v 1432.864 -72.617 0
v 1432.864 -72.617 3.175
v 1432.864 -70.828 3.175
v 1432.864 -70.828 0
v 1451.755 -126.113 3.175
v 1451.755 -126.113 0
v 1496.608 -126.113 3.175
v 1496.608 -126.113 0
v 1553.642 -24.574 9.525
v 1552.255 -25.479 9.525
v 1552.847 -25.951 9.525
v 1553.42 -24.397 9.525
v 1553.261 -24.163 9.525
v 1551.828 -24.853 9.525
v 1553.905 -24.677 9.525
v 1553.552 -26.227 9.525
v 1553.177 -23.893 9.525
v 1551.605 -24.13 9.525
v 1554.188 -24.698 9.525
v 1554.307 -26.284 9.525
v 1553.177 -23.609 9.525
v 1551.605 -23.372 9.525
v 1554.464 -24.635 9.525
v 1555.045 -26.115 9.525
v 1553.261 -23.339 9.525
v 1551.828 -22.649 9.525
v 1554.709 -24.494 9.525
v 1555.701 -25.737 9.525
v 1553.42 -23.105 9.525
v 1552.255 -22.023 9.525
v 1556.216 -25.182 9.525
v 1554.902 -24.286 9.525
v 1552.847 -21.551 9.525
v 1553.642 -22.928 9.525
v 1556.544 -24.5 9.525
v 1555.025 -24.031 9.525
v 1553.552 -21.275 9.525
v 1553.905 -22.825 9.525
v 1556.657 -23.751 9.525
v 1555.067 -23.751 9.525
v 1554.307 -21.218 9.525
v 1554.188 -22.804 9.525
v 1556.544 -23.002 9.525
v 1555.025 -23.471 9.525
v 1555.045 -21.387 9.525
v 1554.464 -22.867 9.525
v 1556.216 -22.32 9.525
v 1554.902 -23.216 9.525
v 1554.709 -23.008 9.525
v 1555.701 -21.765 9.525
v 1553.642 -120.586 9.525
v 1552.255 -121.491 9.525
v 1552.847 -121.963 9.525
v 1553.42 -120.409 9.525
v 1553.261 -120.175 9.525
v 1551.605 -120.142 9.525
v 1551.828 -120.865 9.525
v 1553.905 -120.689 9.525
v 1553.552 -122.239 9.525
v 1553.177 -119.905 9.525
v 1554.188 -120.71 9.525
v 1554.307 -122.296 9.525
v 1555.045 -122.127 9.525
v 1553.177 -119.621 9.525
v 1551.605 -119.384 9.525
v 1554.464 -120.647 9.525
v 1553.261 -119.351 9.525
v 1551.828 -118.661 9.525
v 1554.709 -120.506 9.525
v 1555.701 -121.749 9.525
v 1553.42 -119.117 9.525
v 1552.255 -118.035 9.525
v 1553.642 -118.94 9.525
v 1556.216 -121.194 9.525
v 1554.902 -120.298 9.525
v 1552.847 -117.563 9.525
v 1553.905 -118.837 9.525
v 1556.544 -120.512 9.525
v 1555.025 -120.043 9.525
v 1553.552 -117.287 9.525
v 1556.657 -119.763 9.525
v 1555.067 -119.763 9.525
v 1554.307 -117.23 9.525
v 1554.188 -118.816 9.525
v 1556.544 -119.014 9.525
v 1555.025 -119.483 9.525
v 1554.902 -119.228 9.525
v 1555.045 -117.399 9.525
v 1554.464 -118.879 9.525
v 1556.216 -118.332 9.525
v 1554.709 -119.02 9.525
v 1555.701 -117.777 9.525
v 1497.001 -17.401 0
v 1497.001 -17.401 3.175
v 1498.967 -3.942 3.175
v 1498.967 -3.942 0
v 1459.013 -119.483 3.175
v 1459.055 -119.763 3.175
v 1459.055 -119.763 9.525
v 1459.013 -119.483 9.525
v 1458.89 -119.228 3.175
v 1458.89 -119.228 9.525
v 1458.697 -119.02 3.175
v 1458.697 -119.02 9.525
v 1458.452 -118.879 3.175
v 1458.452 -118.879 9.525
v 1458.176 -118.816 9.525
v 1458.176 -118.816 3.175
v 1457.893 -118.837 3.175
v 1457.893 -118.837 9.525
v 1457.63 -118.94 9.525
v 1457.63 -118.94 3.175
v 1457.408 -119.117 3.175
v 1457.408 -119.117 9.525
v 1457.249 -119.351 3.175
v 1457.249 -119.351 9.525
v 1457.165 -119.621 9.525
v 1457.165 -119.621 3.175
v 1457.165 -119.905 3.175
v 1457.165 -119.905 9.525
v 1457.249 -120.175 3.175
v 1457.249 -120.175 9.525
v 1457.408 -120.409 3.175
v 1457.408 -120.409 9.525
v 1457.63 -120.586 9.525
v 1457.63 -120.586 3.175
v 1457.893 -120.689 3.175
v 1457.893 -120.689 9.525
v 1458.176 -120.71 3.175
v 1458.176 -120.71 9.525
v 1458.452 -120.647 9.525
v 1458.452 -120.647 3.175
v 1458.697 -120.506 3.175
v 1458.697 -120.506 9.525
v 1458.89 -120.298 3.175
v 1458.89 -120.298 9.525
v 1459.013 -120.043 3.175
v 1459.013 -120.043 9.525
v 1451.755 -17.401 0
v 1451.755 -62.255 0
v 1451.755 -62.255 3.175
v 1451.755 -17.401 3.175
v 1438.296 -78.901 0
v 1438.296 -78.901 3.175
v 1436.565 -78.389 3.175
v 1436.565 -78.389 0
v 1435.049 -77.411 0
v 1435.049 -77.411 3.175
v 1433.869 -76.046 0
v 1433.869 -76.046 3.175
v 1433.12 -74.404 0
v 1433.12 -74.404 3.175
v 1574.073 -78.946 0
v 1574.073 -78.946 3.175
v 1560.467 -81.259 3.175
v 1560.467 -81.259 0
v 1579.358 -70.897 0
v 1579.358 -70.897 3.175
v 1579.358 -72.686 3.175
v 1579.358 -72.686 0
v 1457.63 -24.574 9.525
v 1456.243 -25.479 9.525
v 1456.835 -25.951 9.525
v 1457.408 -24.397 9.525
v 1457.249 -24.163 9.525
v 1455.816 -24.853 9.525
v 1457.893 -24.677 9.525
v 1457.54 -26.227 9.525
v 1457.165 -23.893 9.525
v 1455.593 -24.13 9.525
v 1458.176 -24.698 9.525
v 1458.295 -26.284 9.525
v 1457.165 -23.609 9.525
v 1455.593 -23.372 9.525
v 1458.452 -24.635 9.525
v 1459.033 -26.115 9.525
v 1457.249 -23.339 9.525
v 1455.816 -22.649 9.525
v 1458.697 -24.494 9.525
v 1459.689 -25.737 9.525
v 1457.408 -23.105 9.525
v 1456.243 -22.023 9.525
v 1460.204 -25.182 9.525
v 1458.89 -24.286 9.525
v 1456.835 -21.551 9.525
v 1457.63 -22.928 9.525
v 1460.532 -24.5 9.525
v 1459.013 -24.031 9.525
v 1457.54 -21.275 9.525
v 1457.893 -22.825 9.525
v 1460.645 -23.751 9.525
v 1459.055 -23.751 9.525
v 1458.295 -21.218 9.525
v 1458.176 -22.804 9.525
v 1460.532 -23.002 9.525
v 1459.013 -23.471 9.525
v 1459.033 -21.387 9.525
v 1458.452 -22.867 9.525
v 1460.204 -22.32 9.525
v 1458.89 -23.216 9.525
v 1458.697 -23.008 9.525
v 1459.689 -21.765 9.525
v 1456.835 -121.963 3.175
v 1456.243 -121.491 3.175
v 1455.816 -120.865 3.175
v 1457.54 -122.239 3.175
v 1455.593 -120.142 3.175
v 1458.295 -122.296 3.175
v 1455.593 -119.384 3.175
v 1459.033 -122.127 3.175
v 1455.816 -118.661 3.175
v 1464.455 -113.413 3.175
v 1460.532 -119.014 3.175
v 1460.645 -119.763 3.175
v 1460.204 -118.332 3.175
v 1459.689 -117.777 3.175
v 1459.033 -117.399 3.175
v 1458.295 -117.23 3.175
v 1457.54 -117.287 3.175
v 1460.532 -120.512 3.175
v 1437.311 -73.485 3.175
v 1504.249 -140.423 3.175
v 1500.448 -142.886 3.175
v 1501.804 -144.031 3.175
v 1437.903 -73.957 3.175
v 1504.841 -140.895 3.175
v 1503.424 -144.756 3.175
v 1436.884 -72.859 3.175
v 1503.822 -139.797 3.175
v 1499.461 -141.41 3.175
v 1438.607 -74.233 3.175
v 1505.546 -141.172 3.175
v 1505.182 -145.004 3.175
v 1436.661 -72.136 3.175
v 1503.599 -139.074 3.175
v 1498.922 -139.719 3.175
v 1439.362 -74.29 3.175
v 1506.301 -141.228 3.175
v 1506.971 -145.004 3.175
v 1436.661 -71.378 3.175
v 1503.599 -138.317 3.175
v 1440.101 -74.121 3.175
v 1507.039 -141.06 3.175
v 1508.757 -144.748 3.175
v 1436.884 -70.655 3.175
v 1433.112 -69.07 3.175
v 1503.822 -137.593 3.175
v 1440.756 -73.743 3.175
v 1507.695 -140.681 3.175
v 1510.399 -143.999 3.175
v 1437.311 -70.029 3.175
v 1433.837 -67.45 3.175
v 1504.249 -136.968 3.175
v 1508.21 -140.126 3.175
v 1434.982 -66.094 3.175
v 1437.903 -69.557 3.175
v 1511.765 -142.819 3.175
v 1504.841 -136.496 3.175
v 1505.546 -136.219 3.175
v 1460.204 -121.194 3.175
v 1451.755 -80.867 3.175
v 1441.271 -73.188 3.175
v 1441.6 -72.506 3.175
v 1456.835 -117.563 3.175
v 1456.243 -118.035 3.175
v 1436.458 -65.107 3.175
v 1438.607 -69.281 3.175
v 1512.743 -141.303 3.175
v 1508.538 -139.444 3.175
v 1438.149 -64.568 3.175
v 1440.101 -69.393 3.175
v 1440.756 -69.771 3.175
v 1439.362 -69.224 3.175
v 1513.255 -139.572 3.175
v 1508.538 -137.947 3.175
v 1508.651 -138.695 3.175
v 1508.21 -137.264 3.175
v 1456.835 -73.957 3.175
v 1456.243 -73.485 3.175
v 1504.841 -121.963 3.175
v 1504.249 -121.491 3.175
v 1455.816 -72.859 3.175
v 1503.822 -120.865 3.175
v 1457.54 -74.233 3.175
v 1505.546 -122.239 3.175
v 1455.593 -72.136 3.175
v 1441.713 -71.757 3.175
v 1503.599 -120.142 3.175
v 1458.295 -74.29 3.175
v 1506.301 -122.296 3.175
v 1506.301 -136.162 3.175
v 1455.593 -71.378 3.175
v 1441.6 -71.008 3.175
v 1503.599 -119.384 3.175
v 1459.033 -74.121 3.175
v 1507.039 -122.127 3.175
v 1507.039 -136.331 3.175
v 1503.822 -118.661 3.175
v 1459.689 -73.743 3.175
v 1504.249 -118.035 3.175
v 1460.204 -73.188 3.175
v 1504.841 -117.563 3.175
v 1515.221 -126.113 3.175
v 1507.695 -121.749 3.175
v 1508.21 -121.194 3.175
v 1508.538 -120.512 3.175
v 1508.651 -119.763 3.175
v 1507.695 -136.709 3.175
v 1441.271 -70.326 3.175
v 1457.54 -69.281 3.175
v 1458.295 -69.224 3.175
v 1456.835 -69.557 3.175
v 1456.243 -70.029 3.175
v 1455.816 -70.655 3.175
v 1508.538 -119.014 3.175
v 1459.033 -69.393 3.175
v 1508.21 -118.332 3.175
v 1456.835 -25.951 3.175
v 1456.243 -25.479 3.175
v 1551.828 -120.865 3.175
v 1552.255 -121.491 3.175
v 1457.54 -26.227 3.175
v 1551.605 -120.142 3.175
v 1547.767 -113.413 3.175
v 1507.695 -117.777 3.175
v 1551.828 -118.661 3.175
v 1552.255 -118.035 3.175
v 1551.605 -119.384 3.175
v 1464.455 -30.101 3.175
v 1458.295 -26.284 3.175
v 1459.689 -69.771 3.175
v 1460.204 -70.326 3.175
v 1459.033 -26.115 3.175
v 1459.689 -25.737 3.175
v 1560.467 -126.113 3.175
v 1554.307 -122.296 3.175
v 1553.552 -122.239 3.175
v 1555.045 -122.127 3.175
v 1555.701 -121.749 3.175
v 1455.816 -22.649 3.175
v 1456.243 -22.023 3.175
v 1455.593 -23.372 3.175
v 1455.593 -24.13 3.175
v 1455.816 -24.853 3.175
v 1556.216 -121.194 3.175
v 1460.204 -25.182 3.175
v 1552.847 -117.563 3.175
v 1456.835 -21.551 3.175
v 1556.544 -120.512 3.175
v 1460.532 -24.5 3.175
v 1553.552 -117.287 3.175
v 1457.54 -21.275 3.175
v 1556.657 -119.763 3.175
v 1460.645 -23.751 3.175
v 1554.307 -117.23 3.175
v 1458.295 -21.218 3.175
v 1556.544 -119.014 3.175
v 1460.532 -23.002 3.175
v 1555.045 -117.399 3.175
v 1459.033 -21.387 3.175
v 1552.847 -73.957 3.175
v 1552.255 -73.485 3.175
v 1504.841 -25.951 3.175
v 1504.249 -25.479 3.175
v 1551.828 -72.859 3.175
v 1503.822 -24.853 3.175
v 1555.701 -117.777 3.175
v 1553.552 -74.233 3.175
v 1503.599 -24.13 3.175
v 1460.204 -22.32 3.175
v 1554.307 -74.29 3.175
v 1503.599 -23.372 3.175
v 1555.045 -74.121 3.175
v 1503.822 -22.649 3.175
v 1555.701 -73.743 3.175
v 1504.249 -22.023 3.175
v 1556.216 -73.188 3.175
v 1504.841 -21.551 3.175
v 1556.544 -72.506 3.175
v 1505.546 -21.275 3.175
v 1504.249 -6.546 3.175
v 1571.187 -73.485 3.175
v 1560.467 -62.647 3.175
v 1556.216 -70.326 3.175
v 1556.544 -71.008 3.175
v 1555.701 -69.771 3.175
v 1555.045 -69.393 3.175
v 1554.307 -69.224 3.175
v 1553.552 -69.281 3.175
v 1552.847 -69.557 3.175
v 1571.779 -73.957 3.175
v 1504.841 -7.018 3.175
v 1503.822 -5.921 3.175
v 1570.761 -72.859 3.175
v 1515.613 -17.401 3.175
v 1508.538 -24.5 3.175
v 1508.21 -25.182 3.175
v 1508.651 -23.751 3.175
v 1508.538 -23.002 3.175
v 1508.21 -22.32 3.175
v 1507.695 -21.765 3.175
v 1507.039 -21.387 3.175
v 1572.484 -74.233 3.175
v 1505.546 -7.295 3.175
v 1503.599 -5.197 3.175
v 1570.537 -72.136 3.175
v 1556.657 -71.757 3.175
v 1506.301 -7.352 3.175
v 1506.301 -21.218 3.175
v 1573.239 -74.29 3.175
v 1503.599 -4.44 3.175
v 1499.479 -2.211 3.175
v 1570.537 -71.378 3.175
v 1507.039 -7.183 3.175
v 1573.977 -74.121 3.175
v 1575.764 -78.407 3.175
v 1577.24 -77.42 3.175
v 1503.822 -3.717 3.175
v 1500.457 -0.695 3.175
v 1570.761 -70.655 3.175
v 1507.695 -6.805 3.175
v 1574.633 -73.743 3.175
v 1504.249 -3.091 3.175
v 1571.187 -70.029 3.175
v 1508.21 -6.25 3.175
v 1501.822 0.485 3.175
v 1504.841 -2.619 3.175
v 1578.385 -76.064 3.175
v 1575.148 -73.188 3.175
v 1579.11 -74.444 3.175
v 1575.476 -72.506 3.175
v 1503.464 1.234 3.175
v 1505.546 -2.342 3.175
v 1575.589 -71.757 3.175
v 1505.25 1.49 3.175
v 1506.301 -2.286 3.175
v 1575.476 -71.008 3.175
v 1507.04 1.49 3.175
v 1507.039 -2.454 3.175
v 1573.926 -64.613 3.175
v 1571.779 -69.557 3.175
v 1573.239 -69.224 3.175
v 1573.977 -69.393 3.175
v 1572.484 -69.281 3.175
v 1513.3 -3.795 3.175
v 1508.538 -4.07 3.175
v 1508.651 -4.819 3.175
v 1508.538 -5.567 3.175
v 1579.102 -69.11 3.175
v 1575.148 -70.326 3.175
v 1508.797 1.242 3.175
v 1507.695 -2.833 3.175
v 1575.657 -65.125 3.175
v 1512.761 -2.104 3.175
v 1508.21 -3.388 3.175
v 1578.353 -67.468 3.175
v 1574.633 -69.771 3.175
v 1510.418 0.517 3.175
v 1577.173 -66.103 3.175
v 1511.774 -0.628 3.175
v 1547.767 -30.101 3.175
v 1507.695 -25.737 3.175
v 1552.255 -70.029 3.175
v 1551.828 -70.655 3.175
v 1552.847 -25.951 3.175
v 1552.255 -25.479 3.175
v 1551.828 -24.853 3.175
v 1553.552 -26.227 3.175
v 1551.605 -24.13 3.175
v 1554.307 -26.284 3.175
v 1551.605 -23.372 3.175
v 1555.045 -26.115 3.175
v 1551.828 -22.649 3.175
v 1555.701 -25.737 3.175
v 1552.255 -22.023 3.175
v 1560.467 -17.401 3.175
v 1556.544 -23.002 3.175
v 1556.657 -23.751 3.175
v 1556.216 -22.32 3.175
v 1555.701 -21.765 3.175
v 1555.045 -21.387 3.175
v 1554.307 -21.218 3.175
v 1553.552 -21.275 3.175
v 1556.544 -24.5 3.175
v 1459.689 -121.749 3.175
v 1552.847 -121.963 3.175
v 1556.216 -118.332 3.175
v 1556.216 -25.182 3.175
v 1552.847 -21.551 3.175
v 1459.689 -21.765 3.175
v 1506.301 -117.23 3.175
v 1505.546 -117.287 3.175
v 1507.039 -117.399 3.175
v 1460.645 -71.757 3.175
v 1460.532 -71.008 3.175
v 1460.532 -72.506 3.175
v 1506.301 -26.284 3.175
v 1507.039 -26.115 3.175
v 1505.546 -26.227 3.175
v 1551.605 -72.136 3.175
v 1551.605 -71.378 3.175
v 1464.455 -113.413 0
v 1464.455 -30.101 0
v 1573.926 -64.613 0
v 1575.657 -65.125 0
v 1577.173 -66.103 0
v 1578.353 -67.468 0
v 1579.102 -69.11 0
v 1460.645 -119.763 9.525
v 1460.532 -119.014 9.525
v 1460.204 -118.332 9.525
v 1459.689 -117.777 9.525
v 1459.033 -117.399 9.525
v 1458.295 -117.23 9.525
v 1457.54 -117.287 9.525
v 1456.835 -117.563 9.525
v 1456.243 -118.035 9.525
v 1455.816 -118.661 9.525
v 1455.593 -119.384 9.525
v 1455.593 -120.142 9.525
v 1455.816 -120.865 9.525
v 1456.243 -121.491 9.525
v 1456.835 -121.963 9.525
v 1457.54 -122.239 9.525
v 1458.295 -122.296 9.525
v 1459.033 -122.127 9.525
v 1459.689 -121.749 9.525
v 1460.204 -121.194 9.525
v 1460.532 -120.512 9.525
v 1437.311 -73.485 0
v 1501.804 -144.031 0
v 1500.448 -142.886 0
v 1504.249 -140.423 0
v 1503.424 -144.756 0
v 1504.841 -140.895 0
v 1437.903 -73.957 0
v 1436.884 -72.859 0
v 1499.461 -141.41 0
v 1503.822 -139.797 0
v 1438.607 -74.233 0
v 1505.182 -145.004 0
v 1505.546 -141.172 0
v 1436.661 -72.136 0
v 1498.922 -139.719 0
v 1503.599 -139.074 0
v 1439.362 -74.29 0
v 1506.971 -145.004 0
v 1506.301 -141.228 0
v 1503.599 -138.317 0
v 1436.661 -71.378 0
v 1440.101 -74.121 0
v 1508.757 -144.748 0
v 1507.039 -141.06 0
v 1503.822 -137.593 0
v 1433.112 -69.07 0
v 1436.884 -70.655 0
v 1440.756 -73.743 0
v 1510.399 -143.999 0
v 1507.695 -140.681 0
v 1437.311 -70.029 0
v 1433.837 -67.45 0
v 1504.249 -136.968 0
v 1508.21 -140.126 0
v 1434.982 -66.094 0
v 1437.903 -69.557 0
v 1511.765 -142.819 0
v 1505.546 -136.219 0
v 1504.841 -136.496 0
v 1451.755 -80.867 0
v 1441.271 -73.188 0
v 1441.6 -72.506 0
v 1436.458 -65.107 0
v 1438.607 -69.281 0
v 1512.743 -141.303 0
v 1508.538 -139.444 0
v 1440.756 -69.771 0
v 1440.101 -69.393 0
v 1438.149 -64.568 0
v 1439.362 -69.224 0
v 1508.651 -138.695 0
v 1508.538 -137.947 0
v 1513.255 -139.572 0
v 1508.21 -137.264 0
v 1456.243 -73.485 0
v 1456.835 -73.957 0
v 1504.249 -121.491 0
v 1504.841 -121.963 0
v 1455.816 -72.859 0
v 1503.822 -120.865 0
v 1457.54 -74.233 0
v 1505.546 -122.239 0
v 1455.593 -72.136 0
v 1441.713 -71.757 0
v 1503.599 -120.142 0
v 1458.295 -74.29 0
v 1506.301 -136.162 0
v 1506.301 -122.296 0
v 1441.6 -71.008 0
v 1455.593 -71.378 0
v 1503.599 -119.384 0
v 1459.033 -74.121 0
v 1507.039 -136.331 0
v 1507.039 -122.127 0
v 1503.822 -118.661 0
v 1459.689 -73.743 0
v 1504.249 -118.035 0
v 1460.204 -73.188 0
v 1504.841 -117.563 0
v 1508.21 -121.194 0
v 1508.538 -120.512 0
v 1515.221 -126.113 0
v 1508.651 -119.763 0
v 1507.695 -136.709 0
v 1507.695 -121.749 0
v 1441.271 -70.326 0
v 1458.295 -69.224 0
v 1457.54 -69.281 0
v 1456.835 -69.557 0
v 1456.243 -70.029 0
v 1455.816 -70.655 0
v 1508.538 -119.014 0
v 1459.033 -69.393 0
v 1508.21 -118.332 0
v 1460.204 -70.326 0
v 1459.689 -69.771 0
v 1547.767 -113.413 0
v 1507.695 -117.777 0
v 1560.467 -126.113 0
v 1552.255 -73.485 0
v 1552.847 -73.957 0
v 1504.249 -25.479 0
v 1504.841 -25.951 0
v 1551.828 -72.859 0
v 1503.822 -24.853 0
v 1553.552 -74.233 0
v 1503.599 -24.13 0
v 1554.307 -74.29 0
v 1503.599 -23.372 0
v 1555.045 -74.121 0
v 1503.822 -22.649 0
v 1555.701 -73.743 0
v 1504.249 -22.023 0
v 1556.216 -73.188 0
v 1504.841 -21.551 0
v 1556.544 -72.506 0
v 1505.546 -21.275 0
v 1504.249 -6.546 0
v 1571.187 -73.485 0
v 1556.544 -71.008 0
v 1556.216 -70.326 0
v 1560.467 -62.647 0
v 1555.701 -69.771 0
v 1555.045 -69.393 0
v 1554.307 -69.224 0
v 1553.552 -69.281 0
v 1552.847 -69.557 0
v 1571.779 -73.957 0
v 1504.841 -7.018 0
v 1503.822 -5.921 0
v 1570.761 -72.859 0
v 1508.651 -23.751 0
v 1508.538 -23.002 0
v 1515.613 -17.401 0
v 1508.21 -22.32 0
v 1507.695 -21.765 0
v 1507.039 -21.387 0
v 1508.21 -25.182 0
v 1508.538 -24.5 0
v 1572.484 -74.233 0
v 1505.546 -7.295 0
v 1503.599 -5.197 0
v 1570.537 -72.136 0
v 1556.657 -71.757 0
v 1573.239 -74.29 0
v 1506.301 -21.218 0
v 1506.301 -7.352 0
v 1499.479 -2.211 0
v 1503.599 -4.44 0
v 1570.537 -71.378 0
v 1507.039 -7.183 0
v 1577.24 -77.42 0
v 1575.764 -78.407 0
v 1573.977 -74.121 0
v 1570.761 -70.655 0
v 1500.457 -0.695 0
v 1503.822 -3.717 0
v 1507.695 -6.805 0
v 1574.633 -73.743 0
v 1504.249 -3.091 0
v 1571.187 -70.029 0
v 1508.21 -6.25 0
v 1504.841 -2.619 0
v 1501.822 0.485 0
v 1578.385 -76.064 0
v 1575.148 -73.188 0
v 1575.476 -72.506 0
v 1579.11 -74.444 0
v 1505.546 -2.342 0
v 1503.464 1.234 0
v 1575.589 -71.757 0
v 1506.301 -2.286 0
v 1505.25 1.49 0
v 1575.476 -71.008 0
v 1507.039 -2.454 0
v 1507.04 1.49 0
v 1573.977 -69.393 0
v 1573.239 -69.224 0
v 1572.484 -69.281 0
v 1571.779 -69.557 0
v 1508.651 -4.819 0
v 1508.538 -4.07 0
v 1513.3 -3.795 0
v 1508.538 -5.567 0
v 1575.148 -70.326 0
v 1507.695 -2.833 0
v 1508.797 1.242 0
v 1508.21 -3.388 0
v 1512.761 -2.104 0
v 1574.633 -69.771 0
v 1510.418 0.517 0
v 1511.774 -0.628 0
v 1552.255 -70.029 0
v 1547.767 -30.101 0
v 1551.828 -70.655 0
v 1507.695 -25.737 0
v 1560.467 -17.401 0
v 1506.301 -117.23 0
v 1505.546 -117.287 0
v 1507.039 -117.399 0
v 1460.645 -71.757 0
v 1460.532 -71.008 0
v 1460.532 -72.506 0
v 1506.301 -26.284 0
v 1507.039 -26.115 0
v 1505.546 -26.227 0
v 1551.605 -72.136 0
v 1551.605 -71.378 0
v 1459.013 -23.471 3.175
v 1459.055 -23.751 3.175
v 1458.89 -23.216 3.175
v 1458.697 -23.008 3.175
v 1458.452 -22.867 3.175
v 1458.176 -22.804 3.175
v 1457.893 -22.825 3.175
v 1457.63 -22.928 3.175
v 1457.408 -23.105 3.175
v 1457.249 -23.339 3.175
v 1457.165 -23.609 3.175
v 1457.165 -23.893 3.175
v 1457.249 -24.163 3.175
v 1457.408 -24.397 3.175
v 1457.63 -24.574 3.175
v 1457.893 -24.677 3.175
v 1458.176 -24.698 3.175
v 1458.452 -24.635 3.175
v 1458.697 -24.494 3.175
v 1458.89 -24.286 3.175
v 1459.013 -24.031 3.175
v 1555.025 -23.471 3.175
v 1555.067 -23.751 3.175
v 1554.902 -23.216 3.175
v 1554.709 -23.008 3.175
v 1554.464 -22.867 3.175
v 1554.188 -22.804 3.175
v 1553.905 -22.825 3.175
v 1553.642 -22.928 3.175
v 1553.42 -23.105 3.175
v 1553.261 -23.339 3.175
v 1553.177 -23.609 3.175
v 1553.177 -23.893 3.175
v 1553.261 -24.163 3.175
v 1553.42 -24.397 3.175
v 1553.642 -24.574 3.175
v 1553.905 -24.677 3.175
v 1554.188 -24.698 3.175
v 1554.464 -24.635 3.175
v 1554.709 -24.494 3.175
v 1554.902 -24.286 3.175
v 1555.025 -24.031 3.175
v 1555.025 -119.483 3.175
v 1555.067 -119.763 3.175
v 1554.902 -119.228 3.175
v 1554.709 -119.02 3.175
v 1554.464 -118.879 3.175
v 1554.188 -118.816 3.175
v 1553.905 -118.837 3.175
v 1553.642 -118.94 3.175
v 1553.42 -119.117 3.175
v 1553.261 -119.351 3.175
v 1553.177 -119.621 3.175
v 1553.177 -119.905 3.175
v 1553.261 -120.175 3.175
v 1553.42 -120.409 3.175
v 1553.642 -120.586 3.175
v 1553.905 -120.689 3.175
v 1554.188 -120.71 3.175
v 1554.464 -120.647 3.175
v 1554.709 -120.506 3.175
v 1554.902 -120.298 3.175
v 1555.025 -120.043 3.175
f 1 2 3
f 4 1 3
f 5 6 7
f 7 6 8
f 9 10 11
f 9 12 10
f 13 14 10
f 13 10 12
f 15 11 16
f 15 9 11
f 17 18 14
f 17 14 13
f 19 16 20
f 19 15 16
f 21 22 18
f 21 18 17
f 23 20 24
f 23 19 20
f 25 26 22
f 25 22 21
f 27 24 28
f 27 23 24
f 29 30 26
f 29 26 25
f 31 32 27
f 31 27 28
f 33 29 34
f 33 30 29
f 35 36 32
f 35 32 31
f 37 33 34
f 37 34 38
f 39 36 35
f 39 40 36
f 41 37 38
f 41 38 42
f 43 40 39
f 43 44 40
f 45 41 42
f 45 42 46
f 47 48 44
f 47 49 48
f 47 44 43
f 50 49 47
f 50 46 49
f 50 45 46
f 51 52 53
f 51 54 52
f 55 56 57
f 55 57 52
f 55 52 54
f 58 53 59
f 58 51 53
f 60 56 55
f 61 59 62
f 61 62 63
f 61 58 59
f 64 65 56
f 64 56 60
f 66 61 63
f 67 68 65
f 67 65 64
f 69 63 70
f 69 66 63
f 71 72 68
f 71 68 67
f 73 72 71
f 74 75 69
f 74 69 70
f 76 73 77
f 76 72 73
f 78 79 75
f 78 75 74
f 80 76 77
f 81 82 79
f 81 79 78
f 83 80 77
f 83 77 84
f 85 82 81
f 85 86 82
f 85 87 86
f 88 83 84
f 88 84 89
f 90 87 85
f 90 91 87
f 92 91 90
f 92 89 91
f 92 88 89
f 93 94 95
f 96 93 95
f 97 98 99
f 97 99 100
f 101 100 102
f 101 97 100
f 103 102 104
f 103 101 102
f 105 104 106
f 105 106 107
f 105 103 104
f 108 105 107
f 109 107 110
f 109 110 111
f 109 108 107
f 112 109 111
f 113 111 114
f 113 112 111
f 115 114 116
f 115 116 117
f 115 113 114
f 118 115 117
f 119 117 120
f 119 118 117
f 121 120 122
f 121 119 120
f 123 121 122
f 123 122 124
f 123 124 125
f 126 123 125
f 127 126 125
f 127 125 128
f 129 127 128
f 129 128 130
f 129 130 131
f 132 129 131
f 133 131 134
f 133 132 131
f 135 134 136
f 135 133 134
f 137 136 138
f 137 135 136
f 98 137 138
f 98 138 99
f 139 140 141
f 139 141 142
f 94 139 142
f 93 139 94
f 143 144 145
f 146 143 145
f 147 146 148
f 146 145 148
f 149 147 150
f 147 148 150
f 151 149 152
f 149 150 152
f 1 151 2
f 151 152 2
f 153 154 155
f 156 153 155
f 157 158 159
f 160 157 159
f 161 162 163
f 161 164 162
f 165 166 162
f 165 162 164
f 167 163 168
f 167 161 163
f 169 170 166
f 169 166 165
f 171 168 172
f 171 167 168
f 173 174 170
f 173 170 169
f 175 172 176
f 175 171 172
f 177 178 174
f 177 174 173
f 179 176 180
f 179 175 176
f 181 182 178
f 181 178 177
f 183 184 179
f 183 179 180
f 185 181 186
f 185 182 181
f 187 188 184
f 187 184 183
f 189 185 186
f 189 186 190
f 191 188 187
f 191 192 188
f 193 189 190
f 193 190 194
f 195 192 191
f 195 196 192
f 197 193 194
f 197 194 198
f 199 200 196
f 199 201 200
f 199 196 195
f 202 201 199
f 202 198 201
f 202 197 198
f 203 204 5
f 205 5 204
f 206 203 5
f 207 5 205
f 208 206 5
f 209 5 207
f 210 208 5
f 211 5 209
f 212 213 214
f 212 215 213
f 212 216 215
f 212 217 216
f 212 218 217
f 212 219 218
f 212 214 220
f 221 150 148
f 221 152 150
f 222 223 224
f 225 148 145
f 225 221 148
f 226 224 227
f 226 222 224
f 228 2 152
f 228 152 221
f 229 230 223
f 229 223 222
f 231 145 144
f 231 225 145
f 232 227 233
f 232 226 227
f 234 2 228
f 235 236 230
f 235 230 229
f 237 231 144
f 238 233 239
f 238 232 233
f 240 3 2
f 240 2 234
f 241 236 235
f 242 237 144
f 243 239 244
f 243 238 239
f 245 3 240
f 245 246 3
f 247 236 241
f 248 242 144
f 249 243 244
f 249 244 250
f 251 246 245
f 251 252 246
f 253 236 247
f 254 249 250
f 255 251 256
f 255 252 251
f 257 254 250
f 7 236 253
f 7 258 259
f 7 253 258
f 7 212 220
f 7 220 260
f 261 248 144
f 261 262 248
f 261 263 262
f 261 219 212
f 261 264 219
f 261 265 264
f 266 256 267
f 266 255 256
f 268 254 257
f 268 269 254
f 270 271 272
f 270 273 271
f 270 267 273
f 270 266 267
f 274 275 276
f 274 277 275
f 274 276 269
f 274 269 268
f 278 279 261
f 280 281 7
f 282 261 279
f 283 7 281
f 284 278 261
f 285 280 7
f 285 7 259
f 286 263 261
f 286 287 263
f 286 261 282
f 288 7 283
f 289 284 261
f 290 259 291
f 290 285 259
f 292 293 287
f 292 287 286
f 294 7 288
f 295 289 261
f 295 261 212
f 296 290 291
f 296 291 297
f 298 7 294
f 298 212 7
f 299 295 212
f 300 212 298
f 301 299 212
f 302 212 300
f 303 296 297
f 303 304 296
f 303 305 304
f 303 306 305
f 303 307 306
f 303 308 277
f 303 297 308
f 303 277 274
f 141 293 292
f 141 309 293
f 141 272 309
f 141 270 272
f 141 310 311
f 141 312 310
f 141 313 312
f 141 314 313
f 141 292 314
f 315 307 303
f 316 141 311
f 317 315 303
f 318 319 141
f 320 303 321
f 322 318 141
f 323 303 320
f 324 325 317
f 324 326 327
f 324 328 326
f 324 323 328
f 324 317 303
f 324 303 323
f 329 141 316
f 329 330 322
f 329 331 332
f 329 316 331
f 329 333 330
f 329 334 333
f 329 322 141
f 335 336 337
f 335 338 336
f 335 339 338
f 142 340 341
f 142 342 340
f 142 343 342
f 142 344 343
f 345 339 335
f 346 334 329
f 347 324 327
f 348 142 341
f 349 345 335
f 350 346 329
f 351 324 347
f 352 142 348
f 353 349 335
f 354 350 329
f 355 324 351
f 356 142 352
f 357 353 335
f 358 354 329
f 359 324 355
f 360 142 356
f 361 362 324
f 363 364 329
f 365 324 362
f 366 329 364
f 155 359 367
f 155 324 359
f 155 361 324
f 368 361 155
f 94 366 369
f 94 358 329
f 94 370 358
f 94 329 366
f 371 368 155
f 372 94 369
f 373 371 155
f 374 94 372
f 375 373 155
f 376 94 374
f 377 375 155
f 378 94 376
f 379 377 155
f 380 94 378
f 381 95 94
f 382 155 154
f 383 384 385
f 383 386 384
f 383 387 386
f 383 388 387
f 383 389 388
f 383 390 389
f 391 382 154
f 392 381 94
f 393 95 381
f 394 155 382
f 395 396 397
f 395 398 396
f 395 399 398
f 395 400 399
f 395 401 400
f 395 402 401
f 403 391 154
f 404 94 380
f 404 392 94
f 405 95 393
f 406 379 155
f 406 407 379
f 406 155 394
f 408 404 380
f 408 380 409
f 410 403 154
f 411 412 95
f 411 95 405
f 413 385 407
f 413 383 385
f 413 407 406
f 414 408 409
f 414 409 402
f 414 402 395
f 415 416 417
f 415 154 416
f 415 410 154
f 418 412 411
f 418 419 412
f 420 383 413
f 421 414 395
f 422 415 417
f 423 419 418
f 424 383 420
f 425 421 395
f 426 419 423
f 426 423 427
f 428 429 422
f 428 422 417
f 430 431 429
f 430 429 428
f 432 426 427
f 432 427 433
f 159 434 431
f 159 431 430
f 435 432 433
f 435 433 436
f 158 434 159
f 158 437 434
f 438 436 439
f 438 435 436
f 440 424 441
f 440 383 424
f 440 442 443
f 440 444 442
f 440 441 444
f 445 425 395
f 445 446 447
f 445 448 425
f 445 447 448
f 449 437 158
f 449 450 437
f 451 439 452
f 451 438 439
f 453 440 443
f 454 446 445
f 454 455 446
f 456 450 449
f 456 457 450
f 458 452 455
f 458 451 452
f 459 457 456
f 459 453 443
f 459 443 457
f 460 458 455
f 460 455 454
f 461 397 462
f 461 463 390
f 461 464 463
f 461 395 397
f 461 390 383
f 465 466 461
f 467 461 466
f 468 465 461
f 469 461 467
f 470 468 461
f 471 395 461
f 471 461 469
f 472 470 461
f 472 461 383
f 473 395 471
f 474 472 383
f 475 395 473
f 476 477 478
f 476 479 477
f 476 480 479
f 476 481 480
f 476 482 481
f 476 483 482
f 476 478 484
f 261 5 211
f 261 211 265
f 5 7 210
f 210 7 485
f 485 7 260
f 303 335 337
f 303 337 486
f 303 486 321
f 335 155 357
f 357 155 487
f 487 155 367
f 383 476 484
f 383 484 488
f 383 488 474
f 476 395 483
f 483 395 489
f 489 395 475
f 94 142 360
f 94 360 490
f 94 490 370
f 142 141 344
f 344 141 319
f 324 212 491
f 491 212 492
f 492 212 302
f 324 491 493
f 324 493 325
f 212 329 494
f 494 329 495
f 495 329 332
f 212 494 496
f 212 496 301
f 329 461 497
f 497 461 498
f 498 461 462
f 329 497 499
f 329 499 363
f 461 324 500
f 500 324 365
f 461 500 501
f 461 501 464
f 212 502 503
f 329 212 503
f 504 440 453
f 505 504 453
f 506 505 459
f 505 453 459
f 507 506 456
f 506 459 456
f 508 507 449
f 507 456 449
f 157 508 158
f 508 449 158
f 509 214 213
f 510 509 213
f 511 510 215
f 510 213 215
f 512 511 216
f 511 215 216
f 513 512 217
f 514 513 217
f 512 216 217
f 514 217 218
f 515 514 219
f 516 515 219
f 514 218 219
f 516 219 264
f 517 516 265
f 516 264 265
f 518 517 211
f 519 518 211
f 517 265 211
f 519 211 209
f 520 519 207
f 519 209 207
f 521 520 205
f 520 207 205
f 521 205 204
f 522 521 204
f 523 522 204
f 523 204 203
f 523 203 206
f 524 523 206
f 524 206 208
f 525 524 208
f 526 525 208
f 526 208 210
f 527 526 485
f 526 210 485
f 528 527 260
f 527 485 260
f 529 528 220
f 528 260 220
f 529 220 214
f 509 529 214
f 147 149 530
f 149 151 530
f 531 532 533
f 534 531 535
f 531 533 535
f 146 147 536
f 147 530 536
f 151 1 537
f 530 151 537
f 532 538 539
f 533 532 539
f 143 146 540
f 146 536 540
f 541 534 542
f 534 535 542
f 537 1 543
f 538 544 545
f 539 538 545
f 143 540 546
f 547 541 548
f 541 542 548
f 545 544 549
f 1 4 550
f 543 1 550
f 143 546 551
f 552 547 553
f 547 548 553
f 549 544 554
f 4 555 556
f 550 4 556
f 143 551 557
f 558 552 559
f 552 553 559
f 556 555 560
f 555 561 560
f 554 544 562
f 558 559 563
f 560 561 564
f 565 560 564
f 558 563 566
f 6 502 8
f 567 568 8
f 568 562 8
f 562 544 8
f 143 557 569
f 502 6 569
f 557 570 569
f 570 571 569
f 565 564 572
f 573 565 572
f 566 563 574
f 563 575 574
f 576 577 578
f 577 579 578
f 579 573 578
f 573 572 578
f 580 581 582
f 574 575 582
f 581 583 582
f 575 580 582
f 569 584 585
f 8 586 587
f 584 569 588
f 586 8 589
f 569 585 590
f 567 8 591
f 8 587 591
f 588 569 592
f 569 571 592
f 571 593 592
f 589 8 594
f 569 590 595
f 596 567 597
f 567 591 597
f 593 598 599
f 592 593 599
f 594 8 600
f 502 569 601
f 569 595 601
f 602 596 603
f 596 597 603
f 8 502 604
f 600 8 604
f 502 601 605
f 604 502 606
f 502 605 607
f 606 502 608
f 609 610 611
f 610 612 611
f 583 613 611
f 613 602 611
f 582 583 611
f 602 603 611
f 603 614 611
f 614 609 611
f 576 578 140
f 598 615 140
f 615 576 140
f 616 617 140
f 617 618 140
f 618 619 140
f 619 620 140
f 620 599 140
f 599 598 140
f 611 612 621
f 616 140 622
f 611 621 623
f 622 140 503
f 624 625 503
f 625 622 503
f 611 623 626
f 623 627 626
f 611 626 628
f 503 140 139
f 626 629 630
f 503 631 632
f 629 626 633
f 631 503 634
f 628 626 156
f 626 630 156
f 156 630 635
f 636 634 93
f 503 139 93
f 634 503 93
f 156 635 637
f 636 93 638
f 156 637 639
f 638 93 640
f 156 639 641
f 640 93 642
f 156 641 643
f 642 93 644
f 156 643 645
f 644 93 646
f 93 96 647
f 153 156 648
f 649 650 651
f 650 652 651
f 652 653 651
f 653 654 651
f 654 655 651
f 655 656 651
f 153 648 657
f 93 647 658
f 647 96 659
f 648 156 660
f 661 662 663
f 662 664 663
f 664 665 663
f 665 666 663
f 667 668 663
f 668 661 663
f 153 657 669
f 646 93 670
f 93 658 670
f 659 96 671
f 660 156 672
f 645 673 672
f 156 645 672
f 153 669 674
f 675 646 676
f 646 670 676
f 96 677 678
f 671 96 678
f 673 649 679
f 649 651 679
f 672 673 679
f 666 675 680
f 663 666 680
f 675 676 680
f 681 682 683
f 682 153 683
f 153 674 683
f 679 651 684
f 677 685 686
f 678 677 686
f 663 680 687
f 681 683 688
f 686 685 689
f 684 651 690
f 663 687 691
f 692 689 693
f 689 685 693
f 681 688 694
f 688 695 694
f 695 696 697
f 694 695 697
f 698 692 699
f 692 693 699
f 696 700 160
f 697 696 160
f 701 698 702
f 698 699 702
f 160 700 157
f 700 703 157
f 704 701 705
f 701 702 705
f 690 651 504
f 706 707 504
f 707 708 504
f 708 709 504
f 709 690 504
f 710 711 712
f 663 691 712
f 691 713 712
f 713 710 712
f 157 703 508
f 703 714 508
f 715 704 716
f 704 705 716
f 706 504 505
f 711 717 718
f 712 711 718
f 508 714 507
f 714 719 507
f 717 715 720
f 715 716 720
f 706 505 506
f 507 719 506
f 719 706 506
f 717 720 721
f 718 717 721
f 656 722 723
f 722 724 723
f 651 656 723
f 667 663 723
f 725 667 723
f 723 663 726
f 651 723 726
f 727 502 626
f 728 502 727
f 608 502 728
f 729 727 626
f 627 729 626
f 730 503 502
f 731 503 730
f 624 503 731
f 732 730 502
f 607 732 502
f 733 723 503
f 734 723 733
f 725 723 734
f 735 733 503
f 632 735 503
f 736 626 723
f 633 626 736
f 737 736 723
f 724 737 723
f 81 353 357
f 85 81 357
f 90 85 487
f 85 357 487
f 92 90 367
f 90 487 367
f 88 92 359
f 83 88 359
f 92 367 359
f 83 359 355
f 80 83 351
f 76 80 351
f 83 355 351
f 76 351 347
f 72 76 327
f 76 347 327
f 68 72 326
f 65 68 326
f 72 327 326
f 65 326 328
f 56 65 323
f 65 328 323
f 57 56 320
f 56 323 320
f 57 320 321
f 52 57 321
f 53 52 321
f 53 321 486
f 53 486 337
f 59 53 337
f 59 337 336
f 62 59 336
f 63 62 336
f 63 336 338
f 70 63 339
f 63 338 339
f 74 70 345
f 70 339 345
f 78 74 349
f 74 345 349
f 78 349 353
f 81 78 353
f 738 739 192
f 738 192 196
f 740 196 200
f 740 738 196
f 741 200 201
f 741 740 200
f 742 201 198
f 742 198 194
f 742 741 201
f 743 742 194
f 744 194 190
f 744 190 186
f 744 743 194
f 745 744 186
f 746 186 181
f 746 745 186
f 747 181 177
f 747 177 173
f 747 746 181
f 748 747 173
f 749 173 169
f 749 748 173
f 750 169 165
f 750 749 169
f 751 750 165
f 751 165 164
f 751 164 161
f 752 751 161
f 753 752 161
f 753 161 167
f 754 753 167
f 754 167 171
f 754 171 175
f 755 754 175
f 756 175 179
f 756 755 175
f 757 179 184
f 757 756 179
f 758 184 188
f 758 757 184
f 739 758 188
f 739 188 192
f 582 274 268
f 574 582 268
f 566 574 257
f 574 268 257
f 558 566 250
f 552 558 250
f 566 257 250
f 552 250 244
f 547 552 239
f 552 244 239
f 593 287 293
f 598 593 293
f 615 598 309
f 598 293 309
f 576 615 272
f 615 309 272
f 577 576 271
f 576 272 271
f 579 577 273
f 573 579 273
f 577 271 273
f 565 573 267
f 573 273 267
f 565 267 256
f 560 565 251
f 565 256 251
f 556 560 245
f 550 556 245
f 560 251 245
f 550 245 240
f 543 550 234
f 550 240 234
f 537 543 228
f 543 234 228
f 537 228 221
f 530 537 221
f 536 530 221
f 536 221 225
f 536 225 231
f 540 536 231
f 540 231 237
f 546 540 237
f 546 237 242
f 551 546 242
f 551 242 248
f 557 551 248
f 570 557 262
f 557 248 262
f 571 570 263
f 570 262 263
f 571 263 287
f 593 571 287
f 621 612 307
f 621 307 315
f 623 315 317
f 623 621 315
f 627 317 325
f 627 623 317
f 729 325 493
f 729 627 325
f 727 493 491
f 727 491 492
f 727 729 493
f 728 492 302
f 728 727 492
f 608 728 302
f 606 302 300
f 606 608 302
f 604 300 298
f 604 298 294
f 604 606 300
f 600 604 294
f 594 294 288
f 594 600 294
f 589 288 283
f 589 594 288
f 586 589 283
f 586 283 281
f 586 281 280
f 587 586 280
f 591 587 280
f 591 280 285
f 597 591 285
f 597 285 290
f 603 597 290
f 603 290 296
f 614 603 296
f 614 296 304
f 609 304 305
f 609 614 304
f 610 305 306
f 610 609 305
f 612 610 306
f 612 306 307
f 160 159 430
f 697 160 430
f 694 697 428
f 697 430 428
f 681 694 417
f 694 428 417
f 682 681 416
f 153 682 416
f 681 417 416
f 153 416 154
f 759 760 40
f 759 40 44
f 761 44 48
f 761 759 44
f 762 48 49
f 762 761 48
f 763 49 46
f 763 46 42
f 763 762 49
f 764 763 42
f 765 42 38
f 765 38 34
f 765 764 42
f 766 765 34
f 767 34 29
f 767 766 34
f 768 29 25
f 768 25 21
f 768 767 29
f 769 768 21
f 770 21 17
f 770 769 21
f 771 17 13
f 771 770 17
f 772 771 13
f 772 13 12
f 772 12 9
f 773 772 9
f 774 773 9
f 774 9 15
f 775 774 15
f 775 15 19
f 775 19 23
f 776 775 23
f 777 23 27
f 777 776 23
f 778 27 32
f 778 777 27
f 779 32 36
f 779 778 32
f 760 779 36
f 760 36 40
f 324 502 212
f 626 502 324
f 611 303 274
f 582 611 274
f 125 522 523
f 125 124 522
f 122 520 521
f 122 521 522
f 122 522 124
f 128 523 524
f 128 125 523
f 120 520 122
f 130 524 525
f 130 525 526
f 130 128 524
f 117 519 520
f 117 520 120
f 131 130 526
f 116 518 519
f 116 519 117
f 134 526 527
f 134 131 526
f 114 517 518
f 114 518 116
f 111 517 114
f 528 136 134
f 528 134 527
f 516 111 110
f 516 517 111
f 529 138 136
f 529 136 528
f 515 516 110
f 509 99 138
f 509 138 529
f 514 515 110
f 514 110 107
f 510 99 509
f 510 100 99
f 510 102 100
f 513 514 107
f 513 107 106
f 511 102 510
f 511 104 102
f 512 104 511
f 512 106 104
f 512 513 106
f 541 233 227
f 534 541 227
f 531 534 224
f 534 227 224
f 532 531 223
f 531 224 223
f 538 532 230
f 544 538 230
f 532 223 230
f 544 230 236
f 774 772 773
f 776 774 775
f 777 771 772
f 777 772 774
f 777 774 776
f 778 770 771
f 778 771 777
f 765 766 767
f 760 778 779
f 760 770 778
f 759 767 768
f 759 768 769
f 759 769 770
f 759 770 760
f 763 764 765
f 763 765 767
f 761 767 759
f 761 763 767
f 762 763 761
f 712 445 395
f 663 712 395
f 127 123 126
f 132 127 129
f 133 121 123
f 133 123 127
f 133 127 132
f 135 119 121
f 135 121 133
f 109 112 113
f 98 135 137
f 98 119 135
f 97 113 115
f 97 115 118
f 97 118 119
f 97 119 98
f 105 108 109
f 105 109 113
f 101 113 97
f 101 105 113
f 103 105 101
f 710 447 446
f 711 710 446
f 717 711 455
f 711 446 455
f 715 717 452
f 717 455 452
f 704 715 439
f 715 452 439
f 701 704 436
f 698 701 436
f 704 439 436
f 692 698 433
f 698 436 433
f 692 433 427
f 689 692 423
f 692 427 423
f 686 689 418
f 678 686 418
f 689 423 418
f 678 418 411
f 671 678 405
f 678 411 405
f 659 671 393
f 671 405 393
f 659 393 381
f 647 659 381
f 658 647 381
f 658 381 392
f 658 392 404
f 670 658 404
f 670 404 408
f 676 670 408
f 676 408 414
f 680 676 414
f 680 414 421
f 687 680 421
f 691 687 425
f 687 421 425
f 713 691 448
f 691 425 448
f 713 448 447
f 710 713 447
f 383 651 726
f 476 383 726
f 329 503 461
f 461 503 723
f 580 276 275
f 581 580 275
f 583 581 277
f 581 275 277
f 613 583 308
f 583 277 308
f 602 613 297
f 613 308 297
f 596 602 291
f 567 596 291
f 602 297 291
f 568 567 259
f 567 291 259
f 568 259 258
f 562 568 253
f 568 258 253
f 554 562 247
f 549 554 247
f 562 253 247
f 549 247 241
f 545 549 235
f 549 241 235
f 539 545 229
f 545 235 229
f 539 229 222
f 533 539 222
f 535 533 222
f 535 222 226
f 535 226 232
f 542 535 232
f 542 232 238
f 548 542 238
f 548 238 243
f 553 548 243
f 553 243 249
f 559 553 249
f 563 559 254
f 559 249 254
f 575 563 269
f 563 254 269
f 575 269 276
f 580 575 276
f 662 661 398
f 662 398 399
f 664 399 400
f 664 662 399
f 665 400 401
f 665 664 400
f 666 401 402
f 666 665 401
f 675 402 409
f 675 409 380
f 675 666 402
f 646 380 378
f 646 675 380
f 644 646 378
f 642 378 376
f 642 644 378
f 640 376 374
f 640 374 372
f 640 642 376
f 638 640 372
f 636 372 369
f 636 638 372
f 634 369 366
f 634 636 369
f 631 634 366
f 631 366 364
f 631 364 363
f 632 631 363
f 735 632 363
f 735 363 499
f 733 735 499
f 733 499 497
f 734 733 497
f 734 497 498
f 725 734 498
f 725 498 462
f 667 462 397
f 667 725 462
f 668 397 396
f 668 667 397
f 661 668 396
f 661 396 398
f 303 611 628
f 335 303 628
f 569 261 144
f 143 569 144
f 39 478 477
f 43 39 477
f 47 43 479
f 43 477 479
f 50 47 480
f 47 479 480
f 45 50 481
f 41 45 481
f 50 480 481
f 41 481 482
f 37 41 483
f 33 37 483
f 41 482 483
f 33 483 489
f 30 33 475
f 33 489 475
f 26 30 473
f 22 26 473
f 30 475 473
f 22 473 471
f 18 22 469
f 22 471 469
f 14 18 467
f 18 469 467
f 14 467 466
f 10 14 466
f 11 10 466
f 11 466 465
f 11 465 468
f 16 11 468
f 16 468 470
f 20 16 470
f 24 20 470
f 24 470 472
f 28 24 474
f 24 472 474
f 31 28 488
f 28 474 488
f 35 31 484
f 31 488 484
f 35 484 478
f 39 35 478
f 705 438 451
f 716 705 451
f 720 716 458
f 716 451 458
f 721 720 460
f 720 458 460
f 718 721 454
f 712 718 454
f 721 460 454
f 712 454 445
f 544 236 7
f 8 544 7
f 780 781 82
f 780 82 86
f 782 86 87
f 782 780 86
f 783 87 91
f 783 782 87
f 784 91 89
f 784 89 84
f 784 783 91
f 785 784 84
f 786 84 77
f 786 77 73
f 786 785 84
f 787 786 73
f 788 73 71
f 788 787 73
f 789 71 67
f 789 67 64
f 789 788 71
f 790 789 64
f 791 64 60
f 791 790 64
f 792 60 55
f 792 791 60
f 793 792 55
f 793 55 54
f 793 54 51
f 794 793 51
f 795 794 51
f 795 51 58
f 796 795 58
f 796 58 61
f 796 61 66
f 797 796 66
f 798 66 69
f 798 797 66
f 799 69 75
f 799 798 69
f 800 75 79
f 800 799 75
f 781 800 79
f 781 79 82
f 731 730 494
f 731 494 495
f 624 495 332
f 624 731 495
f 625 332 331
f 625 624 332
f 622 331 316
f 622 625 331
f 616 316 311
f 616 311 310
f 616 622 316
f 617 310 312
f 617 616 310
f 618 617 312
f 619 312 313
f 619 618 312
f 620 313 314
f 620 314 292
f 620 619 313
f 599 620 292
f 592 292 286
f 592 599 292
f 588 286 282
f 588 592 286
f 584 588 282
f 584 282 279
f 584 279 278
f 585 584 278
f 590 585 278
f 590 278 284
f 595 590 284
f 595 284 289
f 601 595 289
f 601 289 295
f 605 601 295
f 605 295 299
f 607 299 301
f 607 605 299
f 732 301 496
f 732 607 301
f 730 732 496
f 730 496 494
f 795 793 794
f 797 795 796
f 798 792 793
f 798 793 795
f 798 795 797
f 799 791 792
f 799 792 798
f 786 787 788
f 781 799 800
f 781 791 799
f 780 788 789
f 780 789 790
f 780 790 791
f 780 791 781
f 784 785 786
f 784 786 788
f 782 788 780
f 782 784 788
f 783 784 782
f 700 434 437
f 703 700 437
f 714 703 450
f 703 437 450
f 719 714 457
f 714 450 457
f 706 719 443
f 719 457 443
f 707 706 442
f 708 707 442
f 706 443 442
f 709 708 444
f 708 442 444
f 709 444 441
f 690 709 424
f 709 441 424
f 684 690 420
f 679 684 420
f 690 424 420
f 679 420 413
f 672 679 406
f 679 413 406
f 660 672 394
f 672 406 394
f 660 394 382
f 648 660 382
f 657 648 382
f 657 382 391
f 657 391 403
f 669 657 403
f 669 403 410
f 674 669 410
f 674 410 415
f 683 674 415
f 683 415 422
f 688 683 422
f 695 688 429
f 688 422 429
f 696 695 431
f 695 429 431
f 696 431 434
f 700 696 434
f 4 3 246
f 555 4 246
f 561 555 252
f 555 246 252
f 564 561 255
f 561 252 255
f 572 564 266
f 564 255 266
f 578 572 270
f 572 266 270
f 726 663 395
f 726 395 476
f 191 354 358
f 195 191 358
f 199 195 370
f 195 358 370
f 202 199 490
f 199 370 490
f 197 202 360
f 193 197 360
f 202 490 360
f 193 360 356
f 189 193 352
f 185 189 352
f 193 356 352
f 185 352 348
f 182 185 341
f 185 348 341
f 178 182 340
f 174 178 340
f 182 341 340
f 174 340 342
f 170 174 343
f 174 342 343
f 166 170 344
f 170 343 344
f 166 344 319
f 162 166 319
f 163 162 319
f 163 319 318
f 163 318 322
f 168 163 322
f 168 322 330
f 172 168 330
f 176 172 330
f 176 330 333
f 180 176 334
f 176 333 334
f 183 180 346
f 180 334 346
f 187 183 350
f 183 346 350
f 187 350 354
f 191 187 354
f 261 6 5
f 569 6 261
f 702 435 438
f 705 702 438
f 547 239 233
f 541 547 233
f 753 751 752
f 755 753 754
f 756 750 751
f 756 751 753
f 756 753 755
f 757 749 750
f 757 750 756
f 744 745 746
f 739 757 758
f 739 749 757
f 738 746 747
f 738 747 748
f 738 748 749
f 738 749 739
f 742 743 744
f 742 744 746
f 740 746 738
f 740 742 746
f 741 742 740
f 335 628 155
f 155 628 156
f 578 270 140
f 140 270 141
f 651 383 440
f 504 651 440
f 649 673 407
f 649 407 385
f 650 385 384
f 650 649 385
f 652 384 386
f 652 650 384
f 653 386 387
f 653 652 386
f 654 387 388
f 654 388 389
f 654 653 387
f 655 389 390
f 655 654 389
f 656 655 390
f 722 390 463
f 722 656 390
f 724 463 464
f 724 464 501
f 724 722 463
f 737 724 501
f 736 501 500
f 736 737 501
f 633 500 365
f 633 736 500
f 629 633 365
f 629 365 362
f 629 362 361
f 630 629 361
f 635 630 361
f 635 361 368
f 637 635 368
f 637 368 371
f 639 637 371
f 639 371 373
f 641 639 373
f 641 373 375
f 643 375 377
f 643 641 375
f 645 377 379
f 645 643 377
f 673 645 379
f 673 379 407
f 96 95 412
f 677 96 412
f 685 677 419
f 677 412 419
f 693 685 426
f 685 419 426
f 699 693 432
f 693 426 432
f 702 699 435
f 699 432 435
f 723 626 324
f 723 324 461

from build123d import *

# Parameters (mm, degrees)
SKETCH1_W           = 108.712
SKETCH1_H           = 108.712
SKETCH1_R           = 2.54
SKETCH1_R_2         = 3.175
SKETCH1_W_2         = 83.312
SKETCH1_H_2         = 83.312
SKETCH1_R_3         = 0.94996
SKETCH1_R_4         = 0.95
BOSS_EXTRUDE1_DEPTH = 3.175
SKETCH2_R           = 2.54
SKETCH2_R_2         = 0.95
BOSS_EXTRUDE2_DEPTH = 6.35
SKETCH3_R           = 2.54
BOSS_EXTRUDE3_DEPTH = 3.175


with BuildPart() as part:
    # Sketch1 → Boss-Extrude1 (new body)
    # profile 1 of 9: a face of its own
    with BuildSketch(Plane.XY):
        with Locations((1506.110862596, -71.75697427)):
            Rectangle(SKETCH1_W, SKETCH1_H)
        with Locations((1506.110862596, -23.75097427)):
            Circle(SKETCH1_R, mode=Mode.SUBTRACT)
        with Locations((1458.104862596, -23.75097427)):
            Circle(SKETCH1_R_2, mode=Mode.SUBTRACT)
        with Locations((1506.110862596, -119.76297427)):
            Circle(SKETCH1_R, mode=Mode.SUBTRACT)
        with Locations((1554.116862596, -71.75697427)):
            Circle(SKETCH1_R, mode=Mode.SUBTRACT)
        with Locations((1458.104862596, -71.75697427)):
            Circle(SKETCH1_R, mode=Mode.SUBTRACT)
        with Locations((1458.104862596, -119.76297427)):
            Circle(SKETCH1_R, mode=Mode.SUBTRACT)
        with Locations((1554.116862596, -119.76297427)):
            Circle(SKETCH1_R, mode=Mode.SUBTRACT)
        with Locations((1554.116862596, -23.75097427)):
            Circle(SKETCH1_R, mode=Mode.SUBTRACT)
        with Locations((1506.110862596, -71.75697427)):
            Rectangle(SKETCH1_W_2, SKETCH1_H_2, mode=Mode.SUBTRACT)
    # profile 2 of 9: a face of its own
    with BuildSketch(Plane.XY):
        with Locations((1554.116862596, -119.76297427)):
            Circle(SKETCH1_R)
        with Locations((1554.116862596, -119.76297427)):
            Circle(SKETCH1_R_3, mode=Mode.SUBTRACT)
    # profile 3 of 9: a face of its own
    with BuildSketch(Plane.XY):
        with Locations((1554.116862596, -119.76297427)):
            Circle(SKETCH1_R_3)
    # profile 4 of 9: a face of its own
    with BuildSketch(Plane.XY):
        with Locations((1458.104862596, -119.76297427)):
            Circle(SKETCH1_R)
        with Locations((1458.104862596, -119.76297427)):
            Circle(SKETCH1_R_3, mode=Mode.SUBTRACT)
    # profile 5 of 9: a face of its own
    with BuildSketch(Plane.XY):
        with Locations((1458.104862596, -119.76297427)):
            Circle(SKETCH1_R_3)
    # profile 6 of 9: a face of its own
    with BuildSketch(Plane.XY):
        with Locations((1458.104862596, -23.75097427)):
            Circle(SKETCH1_R_2)
        with Locations((1458.104862596, -23.75097427)):
            Circle(SKETCH1_R_4, mode=Mode.SUBTRACT)
    # profile 7 of 9: a face of its own
    with BuildSketch(Plane.XY):
        with Locations((1458.104862596, -23.75097427)):
            Circle(SKETCH1_R_4)
    # profile 8 of 9: a face of its own
    with BuildSketch(Plane.XY):
        with Locations((1554.116862596, -23.75097427)):
            Circle(SKETCH1_R)
        with Locations((1554.116862596, -23.75097427)):
            Circle(SKETCH1_R_3, mode=Mode.SUBTRACT)
    # profile 9 of 9: a face of its own
    with BuildSketch(Plane.XY):
        with Locations((1554.116862596, -23.75097427)):
            Circle(SKETCH1_R_3)
    extrude(amount=BOSS_EXTRUDE1_DEPTH)

    # Sketch2 → Boss-Extrude2 (add)
    # profile 1 of 4: a face of its own
    with BuildSketch(Plane.XY.offset(3.175)):
        with Locations((1554.116862596, -119.76297427)):
            Circle(SKETCH2_R)
        with Locations((1554.116862596, -119.76297427)):
            Circle(SKETCH2_R_2, mode=Mode.SUBTRACT)
    # profile 2 of 4: a face of its own
    with BuildSketch(Plane.XY.offset(3.175)):
        with Locations((1554.116862596, -23.75097427)):
            Circle(SKETCH2_R)
        with Locations((1554.116862596, -23.75097427)):
            Circle(SKETCH2_R_2, mode=Mode.SUBTRACT)
    # profile 3 of 4: a face of its own
    with BuildSketch(Plane.XY.offset(3.175)):
        with Locations((1458.104862596, -23.75097427)):
            Circle(SKETCH2_R)
        with Locations((1458.104862596, -23.75097427)):
            Circle(SKETCH2_R_2, mode=Mode.SUBTRACT)
    # profile 4 of 4: a face of its own
    with BuildSketch(Plane.XY.offset(3.175)):
        with Locations((1458.104862596, -119.76297427)):
            Circle(SKETCH2_R)
        with Locations((1458.104862596, -119.76297427)):
            Circle(SKETCH2_R_2, mode=Mode.SUBTRACT)
    extrude(amount=BOSS_EXTRUDE2_DEPTH)

    # Sketch3 → Boss-Extrude3 (add)
    # profile 1 of 4: a face of its own
    with BuildSketch(Plane.XY.offset(3.175)):
        with BuildLine():
            Line((1513.299858853, -3.795295248), (1515.613291339, -17.40097427))
            Line((1515.613291339, -17.40097427), (1497.000613972, -17.40097427))
            Line((1497.000613972, -17.40097427), (1498.967188582, -3.941668388))
            ThreePointArc((1498.967188582, -3.941668388), (1501.097595235, -0.05597519), (1505.250472182, 1.490264506))
            Line((1505.250472182, 1.490264506), (1506.110862596, 1.490264506))
            Line((1506.110862596, 1.490264506), (1507.039709736, 1.490264506))
            ThreePointArc((1507.039709736, 1.490264506), (1511.136251231, -0.007844339), (1513.299858853, -3.795295248))
        make_face()
        with Locations((1506.110862596, -4.818719074)):
            Circle(SKETCH3_R, mode=Mode.SUBTRACT)
    # profile 2 of 4: a face of its own
    with BuildSketch(Plane.XY.offset(3.175)):
        with BuildLine():
            Line((1432.86362382, -71.75697427), (1432.86362382, -70.82812713))
            ThreePointArc((1432.86362382, -70.82812713), (1434.361732665, -66.731585635), (1438.149183574, -64.567978013))
            Line((1438.149183574, -64.567978013), (1451.754862596, -62.254545527))
            Line((1451.754862596, -62.254545527), (1451.754862596, -80.867222895))
            Line((1451.754862596, -80.867222895), (1438.295556714, -78.900648284))
            ThreePointArc((1438.295556714, -78.900648284), (1434.409863516, -76.770241631), (1432.86362382, -72.617364684))
            Line((1432.86362382, -72.617364684), (1432.86362382, -71.75697427))
        make_face()
        with Locations((1439.1726074, -71.75697427)):
            Circle(SKETCH3_R, mode=Mode.SUBTRACT)
    # profile 3 of 4: a face of its own
    with BuildSketch(Plane.XY.offset(3.175)):
        with BuildLine():
            Line((1574.072541618, -78.945970527), (1560.466862596, -81.259403013))
            Line((1560.466862596, -81.259403013), (1560.466862596, -62.646725646))
            Line((1560.466862596, -62.646725646), (1573.926168478, -64.613300257))
            ThreePointArc((1573.926168478, -64.613300257), (1577.811861676, -66.743706909), (1579.358101372, -70.896583856))
            Line((1579.358101372, -70.896583856), (1579.358101372, -71.75697427))
            Line((1579.358101372, -71.75697427), (1579.358101372, -72.68582141))
            ThreePointArc((1579.358101372, -72.68582141), (1577.859992527, -76.782362905), (1574.072541618, -78.945970527))
        make_face()
        with Locations((1573.049117792, -71.75697427)):
            Circle(SKETCH3_R, mode=Mode.SUBTRACT)
    # profile 4 of 4: a face of its own
    with BuildSketch(Plane.XY.offset(3.175)):
        with BuildLine():
            Line((1498.921866339, -139.718653293), (1496.608433853, -126.11297427))
            Line((1496.608433853, -126.11297427), (1515.22111122, -126.11297427))
            Line((1515.22111122, -126.11297427), (1513.254536609, -139.572280152))
            ThreePointArc((1513.254536609, -139.572280152), (1511.124129957, -143.45797335), (1506.97125301, -145.004213046))
            Line((1506.97125301, -145.004213046), (1506.110862596, -145.004213046))
            Line((1506.110862596, -145.004213046), (1505.182015456, -145.004213046))
            ThreePointArc((1505.182015456, -145.004213046), (1501.085473961, -143.506104201), (1498.921866339, -139.718653293))
        make_face()
        with Locations((1506.110862596, -138.695229466)):
            Circle(SKETCH3_R, mode=Mode.SUBTRACT)
    extrude(amount=-BOSS_EXTRUDE3_DEPTH)


solid = part.part
